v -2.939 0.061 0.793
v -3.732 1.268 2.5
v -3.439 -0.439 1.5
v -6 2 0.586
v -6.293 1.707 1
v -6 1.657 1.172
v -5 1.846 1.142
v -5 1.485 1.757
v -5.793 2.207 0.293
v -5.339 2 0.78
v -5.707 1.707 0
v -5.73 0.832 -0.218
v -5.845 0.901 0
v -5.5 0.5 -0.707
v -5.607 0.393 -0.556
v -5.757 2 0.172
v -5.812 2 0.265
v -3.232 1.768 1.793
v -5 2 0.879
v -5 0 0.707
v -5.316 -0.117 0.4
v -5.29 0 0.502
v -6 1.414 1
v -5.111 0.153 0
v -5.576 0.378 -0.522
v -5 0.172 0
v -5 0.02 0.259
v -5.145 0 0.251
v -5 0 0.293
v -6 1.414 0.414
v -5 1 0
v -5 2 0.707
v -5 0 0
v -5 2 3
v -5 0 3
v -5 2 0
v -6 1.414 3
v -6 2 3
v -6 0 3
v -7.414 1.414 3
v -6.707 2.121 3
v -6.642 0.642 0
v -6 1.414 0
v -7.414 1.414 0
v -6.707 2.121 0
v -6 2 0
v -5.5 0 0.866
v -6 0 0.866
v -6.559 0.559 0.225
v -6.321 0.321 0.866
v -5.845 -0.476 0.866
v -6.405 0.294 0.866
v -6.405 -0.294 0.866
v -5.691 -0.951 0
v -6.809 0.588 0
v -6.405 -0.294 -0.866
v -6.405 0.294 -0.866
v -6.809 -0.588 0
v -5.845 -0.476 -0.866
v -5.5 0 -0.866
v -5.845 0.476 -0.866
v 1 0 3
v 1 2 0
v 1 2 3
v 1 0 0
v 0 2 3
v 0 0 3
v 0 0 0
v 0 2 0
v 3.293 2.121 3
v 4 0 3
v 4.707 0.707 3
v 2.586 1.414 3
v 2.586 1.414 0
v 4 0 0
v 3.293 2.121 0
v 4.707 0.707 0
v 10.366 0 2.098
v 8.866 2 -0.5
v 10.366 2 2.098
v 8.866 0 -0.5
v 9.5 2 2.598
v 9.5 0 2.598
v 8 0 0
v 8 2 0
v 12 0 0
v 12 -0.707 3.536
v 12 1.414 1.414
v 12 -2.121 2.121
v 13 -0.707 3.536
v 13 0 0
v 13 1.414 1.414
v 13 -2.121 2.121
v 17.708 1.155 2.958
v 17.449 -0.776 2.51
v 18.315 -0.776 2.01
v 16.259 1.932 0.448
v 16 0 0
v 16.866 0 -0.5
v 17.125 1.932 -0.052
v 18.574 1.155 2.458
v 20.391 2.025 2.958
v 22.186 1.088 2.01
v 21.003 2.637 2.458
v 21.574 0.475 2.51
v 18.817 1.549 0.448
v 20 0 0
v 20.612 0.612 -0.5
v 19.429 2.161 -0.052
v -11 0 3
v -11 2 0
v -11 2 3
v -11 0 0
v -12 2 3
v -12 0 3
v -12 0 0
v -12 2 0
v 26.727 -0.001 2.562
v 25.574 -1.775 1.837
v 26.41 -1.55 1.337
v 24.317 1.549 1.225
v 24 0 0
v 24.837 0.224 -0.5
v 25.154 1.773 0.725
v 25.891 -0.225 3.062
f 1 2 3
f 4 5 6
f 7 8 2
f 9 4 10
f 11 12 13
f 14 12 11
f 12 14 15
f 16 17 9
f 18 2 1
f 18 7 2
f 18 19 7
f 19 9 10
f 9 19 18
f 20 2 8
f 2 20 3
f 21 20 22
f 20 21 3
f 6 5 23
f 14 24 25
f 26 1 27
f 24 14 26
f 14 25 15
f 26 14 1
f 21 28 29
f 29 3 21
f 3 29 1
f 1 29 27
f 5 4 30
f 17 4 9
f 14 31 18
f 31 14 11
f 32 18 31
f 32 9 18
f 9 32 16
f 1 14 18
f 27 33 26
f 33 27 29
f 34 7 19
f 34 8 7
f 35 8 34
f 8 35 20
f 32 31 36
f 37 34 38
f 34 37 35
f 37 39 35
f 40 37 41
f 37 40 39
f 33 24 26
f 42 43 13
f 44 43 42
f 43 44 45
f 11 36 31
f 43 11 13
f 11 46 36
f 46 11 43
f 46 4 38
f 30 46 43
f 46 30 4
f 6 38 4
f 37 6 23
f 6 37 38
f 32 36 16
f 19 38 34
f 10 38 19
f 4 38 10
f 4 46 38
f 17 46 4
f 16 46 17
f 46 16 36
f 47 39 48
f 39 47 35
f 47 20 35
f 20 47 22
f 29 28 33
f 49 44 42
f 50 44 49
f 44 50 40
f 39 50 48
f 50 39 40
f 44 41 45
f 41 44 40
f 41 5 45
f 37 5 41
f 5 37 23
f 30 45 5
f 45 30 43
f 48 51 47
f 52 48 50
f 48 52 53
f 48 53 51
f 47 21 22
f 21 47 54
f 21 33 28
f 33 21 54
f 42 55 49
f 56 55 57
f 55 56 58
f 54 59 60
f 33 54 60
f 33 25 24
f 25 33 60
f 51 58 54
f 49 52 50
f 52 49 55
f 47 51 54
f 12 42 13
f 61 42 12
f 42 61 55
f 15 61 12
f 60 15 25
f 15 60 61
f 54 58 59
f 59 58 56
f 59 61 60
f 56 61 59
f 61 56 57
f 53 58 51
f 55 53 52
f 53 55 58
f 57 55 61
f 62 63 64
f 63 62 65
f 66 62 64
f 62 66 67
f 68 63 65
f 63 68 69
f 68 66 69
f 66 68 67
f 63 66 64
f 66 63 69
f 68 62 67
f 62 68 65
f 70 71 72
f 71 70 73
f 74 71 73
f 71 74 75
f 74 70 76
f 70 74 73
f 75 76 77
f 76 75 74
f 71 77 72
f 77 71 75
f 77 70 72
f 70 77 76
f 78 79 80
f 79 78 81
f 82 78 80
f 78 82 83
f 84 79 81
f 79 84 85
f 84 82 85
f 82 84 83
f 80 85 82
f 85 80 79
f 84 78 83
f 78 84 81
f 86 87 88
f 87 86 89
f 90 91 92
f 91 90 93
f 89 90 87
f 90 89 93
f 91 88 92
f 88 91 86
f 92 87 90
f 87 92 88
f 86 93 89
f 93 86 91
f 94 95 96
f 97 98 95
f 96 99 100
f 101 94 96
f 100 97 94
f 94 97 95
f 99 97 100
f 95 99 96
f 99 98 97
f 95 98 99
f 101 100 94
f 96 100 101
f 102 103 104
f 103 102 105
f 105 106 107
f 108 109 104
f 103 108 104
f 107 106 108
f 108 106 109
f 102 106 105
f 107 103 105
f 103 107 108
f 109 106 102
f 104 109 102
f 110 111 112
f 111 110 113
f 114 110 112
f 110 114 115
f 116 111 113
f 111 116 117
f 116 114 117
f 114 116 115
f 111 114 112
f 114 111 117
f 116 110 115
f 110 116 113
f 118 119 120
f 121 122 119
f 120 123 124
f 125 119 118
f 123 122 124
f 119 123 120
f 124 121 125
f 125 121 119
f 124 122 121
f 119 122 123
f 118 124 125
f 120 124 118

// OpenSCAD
s=[1,2,3];
//Fine
translate([0,0,0])
rotate(0)
cube(s);

translate([4,0,0])
rotate(45)
cube(s);

translate([8,0,0])
rotate(30,[0,1,0])
cube(s);

translate([12,0,0])
rotate([45])
cube(s);

translate([16,0,0])
rotate([15,30])
cube(s);

translate([20,0,0])
rotate([15,30,45])
cube(s);

//Edges cases
translate([-12,0,0])
{
    rotate(undef)
    rotate() //same as undef
    rotate([])
    cube(s);
}

//when deg_a is an array, the 'v' argument is ignored
translate([24,0,0])
rotate([45,30,15],v=[0,0,0])
cube(s);

//Problems with the parameters
//We mainly care that this calls create a warning
color("red")
translate([-6,0,0])
{
    rotate([45,45,45,45])
    cube(s);

    rotate()
    cube(s);

    rotate("45")
    cube(s);

    rotate(45,[0,1,0,0])
    cube(s);

    rotate(v=[1,0,0])
    cube(s);

    rotate("a","v")
    sphere();

    rotate(v="v",a="a")
    sphere();

    rotate(["a"],["v"])
    sphere();
}
